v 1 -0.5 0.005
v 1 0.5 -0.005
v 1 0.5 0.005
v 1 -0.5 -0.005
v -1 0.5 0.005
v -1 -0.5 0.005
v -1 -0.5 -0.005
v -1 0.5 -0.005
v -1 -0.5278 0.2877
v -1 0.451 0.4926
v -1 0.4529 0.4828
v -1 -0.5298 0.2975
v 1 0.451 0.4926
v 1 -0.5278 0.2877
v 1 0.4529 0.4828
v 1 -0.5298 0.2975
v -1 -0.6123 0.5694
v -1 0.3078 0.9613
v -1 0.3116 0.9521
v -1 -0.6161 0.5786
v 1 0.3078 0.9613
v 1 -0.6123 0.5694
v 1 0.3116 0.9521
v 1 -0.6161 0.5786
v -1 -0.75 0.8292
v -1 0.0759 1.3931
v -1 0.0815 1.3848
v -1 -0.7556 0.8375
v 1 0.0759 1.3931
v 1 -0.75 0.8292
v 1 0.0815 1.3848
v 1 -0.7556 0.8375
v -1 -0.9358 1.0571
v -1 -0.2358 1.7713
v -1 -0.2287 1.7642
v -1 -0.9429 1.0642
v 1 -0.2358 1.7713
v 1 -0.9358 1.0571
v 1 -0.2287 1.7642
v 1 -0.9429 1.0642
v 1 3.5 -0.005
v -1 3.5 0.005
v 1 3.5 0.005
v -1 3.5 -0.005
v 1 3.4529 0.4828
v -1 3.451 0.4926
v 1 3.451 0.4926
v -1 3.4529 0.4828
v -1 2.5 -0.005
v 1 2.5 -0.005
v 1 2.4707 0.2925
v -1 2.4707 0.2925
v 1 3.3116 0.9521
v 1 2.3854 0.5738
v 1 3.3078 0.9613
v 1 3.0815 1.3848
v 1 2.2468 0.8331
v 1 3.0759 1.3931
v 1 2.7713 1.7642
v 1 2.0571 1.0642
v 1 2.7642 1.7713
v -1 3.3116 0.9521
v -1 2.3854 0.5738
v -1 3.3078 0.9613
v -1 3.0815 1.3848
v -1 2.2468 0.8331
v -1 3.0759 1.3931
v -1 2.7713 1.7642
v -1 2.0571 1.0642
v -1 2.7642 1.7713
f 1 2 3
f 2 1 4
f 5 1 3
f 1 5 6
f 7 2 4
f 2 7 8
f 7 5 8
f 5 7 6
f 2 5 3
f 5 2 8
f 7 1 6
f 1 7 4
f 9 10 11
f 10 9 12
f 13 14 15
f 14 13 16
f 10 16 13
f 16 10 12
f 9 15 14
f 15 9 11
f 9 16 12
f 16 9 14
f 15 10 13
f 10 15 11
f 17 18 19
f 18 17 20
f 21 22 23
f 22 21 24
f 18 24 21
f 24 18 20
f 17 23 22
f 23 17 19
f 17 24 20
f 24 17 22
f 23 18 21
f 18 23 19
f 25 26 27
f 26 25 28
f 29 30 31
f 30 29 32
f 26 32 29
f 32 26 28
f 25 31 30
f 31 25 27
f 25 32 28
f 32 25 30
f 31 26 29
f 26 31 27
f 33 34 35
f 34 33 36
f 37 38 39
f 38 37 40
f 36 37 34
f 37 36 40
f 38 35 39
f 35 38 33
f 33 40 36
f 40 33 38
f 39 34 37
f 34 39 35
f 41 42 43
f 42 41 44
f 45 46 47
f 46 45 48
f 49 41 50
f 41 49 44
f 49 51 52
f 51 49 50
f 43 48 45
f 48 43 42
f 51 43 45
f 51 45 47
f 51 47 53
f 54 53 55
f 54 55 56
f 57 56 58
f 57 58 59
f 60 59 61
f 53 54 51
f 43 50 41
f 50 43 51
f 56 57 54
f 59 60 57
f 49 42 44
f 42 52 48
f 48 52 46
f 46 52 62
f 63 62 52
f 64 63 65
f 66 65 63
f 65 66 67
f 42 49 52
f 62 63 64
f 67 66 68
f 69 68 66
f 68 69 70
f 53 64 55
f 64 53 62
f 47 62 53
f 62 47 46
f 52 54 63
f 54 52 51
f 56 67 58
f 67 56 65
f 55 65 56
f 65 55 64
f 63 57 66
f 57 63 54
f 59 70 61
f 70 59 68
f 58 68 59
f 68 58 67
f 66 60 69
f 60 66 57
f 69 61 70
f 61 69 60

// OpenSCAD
use <../polychannel.scad>

// Note: all examples use relative coordinates to specify shape positions.

eps = 0.01;
width = 2;
height = 1;

params_arc = [
    each arc_yz("cube", [width, height, eps], radius=2, angle1=0, delta_angle=45, n=4),
];
translate([0, 0, 0]) {
    polychannel(params_arc, clr="Salmon", show_only_shapes=true);
    translate([0, 3, 0]) polychannel(params_arc);
};
